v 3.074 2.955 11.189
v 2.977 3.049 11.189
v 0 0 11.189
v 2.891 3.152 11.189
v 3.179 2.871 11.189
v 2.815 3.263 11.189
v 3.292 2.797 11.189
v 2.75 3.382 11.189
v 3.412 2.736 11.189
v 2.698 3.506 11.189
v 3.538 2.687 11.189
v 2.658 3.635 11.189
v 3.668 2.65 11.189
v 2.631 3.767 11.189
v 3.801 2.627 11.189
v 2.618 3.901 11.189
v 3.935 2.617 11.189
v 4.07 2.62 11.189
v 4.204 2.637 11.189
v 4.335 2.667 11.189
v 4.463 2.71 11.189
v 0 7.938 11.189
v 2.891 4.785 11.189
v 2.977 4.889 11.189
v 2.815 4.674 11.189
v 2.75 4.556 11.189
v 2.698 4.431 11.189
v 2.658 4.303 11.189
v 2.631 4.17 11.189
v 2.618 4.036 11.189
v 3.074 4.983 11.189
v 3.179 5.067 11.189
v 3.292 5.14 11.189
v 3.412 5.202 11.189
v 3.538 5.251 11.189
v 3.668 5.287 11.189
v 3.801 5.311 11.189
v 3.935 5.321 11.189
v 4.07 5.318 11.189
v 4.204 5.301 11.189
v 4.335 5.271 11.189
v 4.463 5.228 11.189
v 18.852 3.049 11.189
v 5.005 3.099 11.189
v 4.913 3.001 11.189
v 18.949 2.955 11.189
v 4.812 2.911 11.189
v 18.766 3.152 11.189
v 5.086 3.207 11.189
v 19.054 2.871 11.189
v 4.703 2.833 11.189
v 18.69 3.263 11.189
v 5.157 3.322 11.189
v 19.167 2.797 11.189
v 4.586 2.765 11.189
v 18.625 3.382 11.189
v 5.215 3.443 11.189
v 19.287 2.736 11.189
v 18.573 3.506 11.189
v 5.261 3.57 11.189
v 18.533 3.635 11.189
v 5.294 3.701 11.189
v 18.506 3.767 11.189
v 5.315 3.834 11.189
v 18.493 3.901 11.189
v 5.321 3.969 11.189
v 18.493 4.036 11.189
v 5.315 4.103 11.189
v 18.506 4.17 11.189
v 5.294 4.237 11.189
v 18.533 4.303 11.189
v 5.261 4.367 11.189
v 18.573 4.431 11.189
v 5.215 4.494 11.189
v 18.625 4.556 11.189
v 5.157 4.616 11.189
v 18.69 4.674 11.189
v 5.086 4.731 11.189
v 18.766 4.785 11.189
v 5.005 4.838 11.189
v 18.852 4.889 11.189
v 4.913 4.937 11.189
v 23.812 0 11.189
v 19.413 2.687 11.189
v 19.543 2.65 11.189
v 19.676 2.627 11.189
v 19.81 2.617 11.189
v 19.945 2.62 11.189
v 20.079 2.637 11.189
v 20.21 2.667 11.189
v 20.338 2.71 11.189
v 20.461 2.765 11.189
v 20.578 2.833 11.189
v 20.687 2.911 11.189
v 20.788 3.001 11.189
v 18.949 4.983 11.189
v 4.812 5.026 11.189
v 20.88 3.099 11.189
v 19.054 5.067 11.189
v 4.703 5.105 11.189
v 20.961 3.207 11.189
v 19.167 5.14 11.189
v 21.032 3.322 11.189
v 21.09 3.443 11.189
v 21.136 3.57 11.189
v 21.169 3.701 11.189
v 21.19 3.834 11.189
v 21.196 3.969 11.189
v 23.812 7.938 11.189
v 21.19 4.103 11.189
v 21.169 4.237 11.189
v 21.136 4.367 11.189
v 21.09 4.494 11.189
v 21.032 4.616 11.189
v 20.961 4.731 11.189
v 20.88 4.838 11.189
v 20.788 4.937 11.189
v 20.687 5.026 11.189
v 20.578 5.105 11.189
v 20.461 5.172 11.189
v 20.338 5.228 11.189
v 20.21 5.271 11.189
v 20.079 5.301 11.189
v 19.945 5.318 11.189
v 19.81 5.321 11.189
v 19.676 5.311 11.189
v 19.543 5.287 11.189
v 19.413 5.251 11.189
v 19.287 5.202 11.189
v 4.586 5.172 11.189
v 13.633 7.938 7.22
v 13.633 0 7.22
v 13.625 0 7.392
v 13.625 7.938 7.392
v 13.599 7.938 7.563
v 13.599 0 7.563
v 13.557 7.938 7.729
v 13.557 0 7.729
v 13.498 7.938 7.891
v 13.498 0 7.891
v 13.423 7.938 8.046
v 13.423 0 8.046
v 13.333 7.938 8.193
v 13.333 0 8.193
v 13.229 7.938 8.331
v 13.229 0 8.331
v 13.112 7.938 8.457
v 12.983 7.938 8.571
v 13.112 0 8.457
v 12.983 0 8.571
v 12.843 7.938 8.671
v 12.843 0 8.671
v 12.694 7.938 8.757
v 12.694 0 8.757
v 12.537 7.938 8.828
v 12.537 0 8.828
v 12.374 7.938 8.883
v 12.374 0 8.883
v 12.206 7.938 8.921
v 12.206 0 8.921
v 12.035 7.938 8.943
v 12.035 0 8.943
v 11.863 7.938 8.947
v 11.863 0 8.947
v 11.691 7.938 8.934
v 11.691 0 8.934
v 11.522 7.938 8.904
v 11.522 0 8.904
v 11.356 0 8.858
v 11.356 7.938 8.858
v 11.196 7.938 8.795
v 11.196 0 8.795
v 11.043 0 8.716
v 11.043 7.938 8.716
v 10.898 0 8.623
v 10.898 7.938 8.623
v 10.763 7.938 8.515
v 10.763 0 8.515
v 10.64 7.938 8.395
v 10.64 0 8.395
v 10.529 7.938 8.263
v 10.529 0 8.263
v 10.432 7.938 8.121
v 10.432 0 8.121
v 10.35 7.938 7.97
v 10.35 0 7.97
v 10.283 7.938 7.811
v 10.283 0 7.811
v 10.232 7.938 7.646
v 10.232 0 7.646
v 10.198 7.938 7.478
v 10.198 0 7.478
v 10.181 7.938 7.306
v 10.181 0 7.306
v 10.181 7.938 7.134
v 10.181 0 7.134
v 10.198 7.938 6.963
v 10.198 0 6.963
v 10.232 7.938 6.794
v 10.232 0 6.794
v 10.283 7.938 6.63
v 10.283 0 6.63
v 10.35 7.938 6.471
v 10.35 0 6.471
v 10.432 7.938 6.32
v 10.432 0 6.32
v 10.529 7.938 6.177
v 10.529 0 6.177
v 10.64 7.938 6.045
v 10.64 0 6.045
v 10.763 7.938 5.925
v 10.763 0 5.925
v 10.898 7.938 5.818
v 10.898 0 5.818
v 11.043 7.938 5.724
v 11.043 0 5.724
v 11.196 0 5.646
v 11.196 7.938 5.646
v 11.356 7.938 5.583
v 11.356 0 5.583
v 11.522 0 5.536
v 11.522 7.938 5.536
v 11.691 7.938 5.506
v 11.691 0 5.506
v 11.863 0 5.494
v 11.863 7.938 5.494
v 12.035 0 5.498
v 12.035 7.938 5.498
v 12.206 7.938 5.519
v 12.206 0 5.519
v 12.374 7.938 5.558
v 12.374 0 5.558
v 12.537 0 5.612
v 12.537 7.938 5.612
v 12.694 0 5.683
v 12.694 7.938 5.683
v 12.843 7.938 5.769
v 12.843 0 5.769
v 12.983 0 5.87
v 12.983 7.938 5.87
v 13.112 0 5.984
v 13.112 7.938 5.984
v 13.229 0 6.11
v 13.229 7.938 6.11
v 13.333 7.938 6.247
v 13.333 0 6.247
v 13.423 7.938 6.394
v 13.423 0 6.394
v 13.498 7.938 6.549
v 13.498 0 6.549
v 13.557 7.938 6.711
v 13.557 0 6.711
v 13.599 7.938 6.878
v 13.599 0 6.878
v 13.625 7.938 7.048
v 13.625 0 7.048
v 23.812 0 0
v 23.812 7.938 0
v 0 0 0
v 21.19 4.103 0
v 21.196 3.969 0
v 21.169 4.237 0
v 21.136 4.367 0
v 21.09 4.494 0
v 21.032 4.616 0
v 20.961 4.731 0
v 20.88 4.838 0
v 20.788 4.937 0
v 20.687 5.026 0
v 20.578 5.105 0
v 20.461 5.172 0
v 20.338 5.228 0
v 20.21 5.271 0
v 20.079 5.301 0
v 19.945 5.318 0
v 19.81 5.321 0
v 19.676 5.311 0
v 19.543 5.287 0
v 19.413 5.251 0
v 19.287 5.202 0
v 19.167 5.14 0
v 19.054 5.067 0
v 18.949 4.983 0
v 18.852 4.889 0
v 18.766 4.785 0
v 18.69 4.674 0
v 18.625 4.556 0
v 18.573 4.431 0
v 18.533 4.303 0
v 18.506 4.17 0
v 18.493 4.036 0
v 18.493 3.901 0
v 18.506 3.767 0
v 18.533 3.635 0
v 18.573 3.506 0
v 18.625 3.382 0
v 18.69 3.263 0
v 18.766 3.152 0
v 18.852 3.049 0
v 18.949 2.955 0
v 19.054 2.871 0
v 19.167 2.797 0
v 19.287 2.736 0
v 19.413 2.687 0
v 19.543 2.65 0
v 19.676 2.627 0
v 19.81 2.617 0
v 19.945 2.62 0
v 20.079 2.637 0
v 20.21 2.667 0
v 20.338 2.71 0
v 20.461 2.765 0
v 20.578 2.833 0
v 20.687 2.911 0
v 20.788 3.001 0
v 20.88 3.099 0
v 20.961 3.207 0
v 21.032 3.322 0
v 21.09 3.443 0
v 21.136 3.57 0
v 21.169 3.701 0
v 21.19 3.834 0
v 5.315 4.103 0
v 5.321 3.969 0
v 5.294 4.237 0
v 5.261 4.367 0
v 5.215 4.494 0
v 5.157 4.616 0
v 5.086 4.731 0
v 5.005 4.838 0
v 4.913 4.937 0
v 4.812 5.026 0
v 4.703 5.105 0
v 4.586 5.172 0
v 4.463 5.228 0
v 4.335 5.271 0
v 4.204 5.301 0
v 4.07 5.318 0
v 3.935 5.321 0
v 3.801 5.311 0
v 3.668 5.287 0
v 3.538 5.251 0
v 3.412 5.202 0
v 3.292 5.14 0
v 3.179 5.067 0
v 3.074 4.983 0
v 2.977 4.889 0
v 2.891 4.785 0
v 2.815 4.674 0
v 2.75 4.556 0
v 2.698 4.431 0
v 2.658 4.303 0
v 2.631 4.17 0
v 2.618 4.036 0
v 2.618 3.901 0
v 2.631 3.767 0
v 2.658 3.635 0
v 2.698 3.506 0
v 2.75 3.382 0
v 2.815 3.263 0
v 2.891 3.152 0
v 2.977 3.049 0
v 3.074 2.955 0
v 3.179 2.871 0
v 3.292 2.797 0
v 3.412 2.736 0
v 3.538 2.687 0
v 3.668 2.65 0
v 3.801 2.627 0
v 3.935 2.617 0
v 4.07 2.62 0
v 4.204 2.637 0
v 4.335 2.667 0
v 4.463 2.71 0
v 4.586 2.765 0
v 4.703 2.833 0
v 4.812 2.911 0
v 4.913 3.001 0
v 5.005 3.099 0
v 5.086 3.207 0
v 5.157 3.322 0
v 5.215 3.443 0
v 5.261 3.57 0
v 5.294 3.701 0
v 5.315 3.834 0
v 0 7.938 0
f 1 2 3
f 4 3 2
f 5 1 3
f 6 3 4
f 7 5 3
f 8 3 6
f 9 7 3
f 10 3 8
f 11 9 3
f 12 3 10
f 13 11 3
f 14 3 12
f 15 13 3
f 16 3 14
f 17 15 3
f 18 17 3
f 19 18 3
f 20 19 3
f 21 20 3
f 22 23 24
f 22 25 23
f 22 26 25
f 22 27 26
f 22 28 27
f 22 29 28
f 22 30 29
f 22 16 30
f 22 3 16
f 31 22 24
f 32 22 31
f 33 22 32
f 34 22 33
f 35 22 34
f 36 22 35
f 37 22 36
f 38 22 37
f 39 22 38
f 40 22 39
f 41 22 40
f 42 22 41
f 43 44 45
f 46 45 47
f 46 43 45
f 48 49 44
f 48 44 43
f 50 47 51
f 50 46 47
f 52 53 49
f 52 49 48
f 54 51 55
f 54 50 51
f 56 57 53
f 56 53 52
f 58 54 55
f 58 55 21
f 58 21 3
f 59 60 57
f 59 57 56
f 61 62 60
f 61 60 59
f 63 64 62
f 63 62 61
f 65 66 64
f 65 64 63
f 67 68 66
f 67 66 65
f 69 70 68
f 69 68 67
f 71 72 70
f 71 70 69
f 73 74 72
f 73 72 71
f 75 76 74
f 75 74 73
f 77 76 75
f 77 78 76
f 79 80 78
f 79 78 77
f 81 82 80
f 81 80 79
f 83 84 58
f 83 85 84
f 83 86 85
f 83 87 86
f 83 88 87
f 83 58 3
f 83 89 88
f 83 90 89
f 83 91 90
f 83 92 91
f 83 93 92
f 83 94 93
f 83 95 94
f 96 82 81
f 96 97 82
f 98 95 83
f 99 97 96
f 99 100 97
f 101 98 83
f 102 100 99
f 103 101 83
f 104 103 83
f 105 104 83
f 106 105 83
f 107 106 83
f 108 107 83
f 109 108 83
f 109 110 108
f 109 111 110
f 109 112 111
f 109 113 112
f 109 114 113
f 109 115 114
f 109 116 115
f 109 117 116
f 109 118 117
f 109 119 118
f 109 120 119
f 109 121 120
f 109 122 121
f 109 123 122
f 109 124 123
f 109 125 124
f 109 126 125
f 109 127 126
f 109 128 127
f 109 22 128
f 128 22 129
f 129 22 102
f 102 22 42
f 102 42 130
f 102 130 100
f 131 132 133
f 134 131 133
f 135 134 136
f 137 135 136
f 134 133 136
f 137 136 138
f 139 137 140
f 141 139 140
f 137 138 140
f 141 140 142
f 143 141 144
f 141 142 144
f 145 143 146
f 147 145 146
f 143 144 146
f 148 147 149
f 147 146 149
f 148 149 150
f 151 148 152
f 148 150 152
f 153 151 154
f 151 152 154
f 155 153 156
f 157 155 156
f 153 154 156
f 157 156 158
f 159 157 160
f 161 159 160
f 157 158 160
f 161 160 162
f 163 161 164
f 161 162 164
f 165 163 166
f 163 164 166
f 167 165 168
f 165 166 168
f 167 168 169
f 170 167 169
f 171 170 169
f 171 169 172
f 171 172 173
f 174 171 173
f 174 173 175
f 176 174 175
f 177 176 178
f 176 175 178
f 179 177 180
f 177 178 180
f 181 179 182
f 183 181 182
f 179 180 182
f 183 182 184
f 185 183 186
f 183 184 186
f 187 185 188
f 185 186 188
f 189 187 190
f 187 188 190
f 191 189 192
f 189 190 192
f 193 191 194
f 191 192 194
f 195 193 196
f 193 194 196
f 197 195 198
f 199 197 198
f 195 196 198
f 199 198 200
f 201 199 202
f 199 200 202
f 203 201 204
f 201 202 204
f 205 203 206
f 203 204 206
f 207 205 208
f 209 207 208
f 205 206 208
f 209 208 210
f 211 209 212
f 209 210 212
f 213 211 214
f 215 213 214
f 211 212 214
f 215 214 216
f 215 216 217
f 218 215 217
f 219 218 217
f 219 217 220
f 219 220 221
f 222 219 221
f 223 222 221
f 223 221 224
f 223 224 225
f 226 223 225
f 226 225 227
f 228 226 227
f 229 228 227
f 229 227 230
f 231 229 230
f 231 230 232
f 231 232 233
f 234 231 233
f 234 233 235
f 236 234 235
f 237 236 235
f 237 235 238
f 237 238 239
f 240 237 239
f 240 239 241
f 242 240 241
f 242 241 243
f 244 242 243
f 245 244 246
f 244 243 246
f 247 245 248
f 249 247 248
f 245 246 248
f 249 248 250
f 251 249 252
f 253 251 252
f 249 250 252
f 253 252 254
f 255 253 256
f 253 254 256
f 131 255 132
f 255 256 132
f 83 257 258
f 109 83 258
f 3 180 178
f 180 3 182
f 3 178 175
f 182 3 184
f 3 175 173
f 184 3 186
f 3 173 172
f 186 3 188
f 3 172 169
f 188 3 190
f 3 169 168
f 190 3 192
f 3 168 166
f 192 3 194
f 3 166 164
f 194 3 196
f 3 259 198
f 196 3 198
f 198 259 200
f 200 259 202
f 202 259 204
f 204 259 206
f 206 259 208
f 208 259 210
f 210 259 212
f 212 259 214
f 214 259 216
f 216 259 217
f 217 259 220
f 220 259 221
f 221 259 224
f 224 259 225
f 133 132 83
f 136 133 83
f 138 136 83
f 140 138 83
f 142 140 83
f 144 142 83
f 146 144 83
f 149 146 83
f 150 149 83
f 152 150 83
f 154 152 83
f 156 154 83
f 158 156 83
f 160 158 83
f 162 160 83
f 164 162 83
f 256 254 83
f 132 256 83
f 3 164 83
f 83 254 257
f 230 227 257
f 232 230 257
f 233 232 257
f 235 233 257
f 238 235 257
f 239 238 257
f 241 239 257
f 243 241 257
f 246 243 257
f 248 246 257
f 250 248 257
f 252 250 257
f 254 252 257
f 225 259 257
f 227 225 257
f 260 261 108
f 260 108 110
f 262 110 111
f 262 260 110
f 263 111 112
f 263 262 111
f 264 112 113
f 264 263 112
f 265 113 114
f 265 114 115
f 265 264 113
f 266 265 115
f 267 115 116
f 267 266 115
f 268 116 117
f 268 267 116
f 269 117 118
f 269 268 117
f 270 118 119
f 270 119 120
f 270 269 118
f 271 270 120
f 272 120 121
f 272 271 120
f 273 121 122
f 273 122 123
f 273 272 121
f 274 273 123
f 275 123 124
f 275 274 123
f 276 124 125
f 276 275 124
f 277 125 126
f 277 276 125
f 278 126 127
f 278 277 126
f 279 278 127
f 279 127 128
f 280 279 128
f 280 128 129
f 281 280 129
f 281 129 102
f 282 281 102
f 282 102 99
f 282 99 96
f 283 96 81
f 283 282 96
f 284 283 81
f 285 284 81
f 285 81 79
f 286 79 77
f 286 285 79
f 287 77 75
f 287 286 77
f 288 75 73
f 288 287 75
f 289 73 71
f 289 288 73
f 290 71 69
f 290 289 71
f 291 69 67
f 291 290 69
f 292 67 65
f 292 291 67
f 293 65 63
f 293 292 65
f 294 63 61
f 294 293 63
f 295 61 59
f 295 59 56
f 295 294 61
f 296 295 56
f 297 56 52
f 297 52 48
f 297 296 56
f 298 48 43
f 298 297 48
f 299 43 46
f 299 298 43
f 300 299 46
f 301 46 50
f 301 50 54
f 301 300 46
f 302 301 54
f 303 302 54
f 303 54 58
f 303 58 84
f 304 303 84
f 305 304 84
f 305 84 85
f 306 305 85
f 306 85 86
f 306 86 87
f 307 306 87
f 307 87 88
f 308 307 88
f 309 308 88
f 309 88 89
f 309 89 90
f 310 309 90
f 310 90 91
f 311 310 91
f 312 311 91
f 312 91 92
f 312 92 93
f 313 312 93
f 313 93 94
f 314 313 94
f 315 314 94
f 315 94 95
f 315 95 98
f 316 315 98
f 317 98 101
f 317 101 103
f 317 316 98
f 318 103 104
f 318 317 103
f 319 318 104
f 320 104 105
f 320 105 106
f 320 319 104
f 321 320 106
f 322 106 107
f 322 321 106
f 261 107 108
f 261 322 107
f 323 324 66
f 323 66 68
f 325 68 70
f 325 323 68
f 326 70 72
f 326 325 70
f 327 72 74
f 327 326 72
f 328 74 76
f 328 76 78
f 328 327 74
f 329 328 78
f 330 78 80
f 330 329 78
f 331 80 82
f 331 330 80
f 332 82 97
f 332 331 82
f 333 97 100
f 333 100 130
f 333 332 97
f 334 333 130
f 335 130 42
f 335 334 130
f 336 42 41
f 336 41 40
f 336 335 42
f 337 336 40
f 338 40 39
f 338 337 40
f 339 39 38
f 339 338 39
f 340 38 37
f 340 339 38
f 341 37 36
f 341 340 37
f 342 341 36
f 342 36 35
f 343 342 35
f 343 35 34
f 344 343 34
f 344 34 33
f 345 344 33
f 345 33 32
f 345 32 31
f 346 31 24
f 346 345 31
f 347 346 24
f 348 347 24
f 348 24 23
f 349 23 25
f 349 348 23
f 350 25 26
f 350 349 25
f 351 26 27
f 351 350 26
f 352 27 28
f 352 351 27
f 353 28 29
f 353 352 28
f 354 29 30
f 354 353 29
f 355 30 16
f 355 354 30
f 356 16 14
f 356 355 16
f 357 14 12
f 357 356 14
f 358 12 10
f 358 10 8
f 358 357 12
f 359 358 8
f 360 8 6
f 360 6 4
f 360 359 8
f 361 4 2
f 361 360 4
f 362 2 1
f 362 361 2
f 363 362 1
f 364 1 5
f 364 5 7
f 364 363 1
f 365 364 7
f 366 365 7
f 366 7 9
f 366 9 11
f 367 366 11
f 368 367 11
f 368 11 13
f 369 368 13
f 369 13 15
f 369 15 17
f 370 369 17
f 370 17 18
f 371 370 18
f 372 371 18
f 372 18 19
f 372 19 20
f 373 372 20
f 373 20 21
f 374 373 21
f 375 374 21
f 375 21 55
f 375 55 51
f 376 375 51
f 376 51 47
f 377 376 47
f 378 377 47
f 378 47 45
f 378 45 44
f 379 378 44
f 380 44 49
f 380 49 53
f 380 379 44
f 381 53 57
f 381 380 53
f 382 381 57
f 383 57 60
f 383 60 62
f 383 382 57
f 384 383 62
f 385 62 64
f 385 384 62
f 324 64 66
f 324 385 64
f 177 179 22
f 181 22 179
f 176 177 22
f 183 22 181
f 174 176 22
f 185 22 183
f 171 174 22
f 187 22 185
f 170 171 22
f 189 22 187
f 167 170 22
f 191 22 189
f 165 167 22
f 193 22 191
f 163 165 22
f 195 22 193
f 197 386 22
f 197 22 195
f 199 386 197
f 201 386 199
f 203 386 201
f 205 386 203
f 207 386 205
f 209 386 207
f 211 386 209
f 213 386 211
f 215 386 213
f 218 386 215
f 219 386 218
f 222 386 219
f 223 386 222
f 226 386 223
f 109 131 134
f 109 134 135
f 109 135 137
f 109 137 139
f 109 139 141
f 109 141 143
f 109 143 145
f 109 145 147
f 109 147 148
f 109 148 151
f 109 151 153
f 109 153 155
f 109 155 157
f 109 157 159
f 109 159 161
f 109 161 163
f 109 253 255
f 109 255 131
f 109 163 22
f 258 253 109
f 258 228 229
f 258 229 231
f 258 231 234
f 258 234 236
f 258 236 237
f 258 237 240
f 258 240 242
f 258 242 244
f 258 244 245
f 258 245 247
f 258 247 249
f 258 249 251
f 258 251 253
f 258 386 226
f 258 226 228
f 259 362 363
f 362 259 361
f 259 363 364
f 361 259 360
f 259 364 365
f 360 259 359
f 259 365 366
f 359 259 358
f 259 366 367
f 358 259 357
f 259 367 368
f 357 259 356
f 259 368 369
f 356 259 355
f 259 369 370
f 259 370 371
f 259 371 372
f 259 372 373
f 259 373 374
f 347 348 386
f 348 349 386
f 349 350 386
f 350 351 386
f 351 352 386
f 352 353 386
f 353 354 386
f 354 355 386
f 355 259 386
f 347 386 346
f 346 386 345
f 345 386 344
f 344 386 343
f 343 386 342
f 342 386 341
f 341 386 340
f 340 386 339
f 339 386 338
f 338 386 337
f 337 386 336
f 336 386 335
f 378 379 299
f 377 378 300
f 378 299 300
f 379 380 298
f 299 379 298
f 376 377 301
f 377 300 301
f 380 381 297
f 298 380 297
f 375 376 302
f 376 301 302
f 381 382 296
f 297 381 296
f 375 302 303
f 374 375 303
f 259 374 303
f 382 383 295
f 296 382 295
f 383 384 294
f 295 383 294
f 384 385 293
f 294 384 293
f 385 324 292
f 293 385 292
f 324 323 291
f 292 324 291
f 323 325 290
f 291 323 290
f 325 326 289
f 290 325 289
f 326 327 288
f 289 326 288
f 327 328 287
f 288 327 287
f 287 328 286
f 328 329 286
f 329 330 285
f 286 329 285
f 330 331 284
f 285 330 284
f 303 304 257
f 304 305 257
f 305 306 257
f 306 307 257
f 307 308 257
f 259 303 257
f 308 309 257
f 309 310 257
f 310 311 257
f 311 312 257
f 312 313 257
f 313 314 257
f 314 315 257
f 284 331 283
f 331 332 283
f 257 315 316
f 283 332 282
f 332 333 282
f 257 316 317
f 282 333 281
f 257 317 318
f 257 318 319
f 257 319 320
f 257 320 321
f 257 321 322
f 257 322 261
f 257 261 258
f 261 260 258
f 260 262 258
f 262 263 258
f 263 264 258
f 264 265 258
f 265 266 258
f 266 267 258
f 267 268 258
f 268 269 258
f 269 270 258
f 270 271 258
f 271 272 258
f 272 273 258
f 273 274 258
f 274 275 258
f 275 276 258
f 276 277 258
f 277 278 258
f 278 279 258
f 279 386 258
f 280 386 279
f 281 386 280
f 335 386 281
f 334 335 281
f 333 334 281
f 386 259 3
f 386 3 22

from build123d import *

# Parameters (mm, degrees)
F0_W     = 23.8125
F0_H     = 7.9375
F0_R     = 1.35255
F1_DEPTH = 11.189043
F2_R     = 1.7272
F3_DEPTH = 7.9375


with BuildPart() as f1:
    # F0 (on Top) → F1 (new body)
    with BuildSketch(Plane.XY):
        with Locations((11.90625, 3.96875)):
            Rectangle(F0_W, F0_H)
        with Locations((3.96875, 3.96875)):
            Circle(F0_R, mode=Mode.SUBTRACT)
        with Locations((19.84375, 3.96875)):
            Circle(F0_R, mode=Mode.SUBTRACT)
    extrude(amount=F1_DEPTH)

    # F2 (on face) → F3 (cut, through all)
    with BuildSketch(Plane.XZ):
        with Locations((11.90625, 7.220293)):
            Circle(F2_R)
    extrude(amount=-F3_DEPTH, mode=Mode.SUBTRACT)


solid = f1.part
